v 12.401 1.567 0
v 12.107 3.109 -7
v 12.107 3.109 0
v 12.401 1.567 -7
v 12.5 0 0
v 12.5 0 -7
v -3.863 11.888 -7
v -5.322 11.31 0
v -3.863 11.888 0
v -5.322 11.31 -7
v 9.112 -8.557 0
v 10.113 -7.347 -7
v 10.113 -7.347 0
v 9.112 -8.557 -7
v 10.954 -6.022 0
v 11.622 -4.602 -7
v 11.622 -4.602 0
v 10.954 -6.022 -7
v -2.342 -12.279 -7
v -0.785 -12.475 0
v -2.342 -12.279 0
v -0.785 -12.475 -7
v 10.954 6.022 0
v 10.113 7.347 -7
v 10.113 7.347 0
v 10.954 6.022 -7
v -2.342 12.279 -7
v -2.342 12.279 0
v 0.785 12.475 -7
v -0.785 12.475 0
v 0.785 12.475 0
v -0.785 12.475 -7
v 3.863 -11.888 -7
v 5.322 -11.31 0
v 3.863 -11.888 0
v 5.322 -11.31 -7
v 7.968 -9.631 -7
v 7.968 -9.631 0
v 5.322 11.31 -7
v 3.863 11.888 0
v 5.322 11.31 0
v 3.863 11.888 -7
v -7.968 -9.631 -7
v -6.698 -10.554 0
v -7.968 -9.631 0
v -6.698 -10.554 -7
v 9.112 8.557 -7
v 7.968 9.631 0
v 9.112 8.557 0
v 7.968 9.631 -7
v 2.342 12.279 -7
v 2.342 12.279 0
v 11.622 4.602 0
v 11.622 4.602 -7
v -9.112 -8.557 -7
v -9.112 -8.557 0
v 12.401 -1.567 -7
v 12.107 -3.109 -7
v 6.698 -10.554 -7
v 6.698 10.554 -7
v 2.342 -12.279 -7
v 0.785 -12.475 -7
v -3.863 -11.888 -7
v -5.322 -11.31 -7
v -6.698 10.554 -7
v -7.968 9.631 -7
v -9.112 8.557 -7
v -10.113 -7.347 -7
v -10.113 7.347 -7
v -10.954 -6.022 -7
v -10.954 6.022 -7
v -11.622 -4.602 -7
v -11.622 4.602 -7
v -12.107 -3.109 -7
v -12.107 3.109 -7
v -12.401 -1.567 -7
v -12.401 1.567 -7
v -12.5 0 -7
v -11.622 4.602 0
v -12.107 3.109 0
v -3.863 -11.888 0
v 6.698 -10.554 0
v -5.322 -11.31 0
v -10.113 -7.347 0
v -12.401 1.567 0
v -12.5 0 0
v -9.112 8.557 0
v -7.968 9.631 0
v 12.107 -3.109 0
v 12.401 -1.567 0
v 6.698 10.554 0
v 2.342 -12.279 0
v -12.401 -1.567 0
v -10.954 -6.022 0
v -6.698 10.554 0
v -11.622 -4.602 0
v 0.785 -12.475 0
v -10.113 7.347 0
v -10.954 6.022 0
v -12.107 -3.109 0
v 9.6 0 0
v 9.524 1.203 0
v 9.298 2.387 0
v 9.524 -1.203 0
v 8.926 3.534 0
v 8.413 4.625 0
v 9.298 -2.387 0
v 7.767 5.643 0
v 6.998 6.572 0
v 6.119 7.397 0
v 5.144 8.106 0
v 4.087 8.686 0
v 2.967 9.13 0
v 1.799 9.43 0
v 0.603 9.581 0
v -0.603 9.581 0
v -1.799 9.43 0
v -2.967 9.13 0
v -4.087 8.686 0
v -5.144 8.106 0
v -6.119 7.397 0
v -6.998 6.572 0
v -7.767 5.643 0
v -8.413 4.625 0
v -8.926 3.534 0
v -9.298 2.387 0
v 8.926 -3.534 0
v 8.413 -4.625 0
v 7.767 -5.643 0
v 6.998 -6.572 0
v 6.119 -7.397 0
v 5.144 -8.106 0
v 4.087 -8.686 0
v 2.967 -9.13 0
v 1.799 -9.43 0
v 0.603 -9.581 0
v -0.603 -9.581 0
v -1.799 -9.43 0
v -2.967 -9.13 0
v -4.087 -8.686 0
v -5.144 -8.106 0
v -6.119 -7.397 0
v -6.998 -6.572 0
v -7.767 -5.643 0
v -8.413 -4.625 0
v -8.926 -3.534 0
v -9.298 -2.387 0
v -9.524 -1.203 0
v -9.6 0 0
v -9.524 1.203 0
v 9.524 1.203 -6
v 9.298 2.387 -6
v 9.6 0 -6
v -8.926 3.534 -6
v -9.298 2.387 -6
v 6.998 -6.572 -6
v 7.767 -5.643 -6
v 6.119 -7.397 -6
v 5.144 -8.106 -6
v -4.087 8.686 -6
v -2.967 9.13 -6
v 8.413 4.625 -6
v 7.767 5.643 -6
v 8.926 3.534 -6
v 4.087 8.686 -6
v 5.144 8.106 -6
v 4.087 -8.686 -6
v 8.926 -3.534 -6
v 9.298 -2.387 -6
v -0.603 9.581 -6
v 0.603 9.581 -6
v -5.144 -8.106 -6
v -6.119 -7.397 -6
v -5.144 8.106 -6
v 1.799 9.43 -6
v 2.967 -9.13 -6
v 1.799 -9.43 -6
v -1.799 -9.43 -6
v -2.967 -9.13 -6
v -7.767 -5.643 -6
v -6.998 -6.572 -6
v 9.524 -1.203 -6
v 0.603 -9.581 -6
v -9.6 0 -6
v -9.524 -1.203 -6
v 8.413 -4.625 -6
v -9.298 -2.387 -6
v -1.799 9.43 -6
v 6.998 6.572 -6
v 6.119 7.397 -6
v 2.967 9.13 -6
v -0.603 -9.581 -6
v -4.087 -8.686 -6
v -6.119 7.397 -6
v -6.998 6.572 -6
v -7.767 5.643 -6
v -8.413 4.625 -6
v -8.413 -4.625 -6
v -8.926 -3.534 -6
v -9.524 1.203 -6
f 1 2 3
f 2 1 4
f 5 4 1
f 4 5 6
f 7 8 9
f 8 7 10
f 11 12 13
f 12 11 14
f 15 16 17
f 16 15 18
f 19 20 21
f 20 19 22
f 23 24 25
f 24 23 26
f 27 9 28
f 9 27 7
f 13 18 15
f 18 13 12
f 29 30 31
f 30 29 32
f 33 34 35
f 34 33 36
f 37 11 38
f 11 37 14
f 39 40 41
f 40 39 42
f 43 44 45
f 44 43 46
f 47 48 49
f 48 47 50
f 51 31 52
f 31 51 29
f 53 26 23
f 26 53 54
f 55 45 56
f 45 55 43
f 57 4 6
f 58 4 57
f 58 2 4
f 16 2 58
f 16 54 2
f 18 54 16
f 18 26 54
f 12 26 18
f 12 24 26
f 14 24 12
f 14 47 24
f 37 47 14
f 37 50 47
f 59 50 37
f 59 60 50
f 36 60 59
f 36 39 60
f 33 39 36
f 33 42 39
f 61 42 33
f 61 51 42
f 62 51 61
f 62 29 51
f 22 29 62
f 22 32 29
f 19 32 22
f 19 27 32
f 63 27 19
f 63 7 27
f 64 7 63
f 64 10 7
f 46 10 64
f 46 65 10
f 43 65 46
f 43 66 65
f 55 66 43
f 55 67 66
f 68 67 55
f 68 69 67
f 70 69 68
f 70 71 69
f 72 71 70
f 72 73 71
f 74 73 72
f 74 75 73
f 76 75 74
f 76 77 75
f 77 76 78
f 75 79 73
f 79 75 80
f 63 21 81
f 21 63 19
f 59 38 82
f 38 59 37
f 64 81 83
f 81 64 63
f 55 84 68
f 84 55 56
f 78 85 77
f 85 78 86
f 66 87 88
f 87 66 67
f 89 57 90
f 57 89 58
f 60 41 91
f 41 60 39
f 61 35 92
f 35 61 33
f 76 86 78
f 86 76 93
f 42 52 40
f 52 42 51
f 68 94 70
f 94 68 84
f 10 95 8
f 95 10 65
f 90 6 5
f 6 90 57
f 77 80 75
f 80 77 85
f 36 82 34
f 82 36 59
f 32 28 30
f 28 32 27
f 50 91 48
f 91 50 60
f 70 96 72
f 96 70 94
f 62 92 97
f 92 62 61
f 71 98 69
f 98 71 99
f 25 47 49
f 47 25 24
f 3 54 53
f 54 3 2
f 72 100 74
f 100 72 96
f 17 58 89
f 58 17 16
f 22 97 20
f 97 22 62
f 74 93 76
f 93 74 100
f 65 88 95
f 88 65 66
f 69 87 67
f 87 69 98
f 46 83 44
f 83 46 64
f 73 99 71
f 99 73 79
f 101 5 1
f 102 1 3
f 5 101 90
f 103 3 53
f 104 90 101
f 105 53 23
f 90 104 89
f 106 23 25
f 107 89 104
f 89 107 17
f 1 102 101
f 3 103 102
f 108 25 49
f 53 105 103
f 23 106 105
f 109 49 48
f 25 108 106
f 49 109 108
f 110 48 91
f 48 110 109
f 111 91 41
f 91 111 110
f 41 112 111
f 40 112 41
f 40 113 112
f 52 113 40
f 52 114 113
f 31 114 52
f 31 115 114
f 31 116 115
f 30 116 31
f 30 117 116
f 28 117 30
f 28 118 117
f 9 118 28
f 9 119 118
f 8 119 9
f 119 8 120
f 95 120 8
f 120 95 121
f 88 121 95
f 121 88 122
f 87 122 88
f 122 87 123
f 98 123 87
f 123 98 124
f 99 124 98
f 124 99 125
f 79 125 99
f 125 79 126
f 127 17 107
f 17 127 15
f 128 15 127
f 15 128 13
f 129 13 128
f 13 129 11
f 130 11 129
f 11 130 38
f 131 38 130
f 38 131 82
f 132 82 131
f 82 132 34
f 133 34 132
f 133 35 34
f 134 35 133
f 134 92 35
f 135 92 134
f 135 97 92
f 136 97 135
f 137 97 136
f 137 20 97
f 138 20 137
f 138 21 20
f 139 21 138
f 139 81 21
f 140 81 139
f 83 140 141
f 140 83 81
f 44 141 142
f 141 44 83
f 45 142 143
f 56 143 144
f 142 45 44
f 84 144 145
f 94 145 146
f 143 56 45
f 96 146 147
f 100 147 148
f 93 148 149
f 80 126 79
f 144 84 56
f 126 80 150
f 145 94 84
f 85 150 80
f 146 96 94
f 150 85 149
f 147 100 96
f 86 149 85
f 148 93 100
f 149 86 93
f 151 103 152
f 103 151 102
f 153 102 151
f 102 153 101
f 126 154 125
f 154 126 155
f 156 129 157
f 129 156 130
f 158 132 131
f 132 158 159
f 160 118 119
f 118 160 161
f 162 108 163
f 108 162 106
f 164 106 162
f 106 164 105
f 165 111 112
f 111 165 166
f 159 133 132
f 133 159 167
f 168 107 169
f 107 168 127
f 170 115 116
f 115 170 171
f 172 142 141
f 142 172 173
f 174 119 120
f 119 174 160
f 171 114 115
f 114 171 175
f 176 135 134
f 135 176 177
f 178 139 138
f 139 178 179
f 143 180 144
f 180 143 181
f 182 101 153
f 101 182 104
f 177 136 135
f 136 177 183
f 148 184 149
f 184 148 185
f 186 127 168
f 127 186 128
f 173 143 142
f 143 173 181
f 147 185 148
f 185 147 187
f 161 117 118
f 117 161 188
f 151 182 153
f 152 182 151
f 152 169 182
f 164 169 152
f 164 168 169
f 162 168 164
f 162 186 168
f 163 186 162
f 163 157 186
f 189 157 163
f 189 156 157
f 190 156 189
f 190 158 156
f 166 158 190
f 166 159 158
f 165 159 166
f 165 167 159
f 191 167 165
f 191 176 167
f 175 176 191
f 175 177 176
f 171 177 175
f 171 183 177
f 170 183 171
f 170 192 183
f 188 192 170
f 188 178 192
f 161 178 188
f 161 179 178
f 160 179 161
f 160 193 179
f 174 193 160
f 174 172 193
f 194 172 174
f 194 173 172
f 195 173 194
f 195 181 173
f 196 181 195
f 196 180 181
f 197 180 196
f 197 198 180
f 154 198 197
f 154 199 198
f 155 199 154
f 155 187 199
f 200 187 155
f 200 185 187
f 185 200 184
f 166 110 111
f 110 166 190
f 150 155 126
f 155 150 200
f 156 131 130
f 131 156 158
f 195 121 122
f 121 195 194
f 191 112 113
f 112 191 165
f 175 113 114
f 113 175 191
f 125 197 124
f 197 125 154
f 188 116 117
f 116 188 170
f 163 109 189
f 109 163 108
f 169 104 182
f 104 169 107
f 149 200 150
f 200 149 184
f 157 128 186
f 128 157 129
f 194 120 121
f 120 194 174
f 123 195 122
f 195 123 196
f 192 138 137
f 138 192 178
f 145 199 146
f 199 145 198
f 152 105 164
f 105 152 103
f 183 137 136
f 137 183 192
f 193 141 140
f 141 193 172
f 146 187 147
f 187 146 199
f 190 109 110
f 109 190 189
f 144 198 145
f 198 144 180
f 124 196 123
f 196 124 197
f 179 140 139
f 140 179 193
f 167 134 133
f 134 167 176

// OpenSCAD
$fn = 50;


difference() {
	union() {
		translate(v = [0, 0, -7.0000000000]) {
			cylinder(h = 7, r = 12.5000000000);
		}
	}
	union() {
		#translate(v = [0, 0, -6.0000000000]) {
			cylinder(h = 6, r = 9.6000000000);
		}
	}
}
